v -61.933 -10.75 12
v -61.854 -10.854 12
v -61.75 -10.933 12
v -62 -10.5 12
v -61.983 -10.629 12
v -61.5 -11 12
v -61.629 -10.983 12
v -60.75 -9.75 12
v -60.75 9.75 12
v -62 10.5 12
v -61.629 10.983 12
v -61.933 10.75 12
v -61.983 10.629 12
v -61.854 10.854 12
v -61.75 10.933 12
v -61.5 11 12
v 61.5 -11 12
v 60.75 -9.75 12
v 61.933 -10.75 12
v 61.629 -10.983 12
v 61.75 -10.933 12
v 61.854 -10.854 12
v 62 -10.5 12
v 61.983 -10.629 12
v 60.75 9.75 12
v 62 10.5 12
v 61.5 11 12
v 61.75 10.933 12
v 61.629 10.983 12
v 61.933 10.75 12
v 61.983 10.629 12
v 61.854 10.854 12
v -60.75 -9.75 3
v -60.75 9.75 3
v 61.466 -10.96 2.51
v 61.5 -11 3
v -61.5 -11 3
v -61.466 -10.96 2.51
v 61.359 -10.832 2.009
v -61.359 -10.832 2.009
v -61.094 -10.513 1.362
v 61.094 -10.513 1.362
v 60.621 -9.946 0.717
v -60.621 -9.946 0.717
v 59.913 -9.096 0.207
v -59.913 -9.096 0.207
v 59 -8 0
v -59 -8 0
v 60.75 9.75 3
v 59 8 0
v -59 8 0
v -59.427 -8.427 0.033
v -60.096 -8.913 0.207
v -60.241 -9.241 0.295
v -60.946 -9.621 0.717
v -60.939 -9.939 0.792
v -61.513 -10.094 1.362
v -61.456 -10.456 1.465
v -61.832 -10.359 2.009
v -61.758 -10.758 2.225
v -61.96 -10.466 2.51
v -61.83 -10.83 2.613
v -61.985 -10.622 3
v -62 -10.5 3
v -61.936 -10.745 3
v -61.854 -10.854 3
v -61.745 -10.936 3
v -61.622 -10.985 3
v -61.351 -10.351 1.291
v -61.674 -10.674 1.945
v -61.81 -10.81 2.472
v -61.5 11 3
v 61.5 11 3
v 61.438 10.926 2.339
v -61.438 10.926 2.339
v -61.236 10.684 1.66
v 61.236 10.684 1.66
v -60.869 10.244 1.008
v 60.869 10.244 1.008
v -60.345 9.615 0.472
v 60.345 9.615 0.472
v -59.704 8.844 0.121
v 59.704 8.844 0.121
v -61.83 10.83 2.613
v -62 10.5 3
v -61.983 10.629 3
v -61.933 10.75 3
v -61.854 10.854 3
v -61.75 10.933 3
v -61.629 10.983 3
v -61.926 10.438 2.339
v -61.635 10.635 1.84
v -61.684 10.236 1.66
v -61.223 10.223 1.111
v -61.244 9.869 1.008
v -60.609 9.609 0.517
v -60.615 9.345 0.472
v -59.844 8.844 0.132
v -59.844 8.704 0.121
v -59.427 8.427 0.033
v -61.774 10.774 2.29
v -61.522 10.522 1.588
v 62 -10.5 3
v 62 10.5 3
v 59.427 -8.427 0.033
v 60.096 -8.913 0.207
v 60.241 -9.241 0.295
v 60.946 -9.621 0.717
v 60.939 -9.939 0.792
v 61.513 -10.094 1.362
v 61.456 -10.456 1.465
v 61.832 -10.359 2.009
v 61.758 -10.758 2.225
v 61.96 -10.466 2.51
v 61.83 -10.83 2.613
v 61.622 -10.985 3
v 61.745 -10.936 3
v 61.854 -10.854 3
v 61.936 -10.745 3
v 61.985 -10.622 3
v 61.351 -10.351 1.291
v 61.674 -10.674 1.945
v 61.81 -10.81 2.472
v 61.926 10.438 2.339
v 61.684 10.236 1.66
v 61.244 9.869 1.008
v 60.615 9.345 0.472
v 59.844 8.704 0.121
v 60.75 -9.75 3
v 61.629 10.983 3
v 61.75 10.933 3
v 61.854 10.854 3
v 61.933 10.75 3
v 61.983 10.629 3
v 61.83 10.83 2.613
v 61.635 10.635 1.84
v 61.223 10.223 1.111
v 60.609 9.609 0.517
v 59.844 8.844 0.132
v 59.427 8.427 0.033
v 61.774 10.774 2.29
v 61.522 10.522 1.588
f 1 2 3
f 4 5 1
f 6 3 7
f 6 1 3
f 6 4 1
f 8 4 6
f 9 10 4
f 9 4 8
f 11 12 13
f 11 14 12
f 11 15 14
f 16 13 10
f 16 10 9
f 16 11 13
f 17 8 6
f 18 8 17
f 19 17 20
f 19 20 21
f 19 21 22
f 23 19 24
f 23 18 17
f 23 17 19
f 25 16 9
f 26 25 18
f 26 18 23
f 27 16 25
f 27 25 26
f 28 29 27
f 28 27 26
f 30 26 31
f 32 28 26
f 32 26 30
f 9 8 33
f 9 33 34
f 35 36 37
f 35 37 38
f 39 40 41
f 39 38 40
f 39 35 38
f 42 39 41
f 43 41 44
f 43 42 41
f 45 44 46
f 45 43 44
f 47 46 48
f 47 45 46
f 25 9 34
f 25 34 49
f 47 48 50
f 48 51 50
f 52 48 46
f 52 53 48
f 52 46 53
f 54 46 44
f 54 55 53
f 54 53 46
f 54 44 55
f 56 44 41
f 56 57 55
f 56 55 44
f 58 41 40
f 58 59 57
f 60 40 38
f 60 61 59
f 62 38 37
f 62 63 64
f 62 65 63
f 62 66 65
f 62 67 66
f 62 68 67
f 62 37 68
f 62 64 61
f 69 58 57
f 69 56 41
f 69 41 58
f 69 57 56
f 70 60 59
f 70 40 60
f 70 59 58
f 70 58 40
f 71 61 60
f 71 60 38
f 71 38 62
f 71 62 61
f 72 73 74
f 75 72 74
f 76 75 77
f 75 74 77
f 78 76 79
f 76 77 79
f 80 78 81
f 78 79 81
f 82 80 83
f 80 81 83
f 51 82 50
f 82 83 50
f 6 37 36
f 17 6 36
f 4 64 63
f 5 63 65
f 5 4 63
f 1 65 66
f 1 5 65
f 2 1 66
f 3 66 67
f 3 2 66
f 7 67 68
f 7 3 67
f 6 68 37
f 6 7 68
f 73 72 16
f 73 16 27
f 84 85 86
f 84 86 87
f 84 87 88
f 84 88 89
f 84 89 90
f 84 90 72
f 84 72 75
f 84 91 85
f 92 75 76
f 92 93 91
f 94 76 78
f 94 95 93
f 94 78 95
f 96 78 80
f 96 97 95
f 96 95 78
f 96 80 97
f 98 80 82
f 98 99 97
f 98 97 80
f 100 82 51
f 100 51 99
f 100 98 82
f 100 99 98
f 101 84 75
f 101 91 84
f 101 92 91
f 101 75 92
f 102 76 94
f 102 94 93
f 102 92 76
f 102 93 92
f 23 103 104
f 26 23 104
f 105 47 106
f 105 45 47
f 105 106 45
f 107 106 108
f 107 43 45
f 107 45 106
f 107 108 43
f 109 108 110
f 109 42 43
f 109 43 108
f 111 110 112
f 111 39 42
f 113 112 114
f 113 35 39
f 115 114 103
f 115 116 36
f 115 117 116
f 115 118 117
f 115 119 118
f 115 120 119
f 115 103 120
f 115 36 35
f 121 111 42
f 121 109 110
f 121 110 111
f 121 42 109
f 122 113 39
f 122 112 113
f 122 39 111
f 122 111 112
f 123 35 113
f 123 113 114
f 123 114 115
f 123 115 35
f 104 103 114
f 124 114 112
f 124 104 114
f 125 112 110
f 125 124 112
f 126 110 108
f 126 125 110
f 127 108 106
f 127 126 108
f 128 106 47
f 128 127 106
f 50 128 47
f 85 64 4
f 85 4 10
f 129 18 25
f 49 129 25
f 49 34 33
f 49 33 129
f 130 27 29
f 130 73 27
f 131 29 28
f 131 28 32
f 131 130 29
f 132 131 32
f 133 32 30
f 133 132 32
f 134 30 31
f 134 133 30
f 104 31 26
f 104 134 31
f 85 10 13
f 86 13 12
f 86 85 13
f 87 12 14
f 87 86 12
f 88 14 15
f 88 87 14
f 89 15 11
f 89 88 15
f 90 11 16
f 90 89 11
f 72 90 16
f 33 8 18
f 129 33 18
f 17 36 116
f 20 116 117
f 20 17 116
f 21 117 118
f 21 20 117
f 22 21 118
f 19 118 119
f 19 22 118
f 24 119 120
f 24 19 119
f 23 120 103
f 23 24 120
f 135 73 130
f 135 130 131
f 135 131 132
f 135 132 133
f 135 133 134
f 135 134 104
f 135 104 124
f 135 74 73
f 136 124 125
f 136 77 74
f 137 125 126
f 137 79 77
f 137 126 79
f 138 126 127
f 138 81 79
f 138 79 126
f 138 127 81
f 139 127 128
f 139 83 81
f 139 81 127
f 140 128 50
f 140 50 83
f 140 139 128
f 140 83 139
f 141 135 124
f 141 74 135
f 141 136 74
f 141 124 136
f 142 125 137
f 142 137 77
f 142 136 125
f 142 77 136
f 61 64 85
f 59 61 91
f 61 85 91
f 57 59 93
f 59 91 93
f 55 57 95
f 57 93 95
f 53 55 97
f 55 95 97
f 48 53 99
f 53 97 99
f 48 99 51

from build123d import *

# Parameters (mm, degrees)
F0_W     = 124
F0_H     = 22
F1_DEPTH = 12
F2_DEPTH = 11
F3_R     = 3
F4_W     = 121.5
F4_H     = 19.5
F5_DEPTH = 9
F6_R     = 0.5


with BuildPart() as f1:
    # F0 (on Top) → F1 (new body)
    with BuildSketch(Plane.XY):
        Rectangle(F0_W, F0_H)
    extrude(amount=F1_DEPTH)

    # F0 (on Top) → F2 (join)
    with BuildSketch(Plane.XY):
        Rectangle(F0_W, F0_H)
    extrude(amount=F2_DEPTH)

    # F3
    f3_edges = [f1.edges().sort_by_distance(p)[0] for p in [
        (0, -11, 0),
        (-62, 0, 0),
        (0, 11, 0),
        (62, 0, 0),
    ]]
    fillet(f3_edges, radius=F3_R)

    # F4 (on face) → F5 (cut)
    with BuildSketch(Plane.XY.offset(12)):
        Rectangle(F4_W, F4_H)
    extrude(amount=-F5_DEPTH, mode=Mode.SUBTRACT)

    # F6
    f6_edges = [f1.edges().sort_by_distance(p)[0] for p in [
        (-62, 11, 7.5),
        (-62, -11, 7.5),
        (62, 11, 7.5),
        (62, -11, 7.5),
    ]]
    fillet(f6_edges, radius=F6_R)


solid = f1.part
